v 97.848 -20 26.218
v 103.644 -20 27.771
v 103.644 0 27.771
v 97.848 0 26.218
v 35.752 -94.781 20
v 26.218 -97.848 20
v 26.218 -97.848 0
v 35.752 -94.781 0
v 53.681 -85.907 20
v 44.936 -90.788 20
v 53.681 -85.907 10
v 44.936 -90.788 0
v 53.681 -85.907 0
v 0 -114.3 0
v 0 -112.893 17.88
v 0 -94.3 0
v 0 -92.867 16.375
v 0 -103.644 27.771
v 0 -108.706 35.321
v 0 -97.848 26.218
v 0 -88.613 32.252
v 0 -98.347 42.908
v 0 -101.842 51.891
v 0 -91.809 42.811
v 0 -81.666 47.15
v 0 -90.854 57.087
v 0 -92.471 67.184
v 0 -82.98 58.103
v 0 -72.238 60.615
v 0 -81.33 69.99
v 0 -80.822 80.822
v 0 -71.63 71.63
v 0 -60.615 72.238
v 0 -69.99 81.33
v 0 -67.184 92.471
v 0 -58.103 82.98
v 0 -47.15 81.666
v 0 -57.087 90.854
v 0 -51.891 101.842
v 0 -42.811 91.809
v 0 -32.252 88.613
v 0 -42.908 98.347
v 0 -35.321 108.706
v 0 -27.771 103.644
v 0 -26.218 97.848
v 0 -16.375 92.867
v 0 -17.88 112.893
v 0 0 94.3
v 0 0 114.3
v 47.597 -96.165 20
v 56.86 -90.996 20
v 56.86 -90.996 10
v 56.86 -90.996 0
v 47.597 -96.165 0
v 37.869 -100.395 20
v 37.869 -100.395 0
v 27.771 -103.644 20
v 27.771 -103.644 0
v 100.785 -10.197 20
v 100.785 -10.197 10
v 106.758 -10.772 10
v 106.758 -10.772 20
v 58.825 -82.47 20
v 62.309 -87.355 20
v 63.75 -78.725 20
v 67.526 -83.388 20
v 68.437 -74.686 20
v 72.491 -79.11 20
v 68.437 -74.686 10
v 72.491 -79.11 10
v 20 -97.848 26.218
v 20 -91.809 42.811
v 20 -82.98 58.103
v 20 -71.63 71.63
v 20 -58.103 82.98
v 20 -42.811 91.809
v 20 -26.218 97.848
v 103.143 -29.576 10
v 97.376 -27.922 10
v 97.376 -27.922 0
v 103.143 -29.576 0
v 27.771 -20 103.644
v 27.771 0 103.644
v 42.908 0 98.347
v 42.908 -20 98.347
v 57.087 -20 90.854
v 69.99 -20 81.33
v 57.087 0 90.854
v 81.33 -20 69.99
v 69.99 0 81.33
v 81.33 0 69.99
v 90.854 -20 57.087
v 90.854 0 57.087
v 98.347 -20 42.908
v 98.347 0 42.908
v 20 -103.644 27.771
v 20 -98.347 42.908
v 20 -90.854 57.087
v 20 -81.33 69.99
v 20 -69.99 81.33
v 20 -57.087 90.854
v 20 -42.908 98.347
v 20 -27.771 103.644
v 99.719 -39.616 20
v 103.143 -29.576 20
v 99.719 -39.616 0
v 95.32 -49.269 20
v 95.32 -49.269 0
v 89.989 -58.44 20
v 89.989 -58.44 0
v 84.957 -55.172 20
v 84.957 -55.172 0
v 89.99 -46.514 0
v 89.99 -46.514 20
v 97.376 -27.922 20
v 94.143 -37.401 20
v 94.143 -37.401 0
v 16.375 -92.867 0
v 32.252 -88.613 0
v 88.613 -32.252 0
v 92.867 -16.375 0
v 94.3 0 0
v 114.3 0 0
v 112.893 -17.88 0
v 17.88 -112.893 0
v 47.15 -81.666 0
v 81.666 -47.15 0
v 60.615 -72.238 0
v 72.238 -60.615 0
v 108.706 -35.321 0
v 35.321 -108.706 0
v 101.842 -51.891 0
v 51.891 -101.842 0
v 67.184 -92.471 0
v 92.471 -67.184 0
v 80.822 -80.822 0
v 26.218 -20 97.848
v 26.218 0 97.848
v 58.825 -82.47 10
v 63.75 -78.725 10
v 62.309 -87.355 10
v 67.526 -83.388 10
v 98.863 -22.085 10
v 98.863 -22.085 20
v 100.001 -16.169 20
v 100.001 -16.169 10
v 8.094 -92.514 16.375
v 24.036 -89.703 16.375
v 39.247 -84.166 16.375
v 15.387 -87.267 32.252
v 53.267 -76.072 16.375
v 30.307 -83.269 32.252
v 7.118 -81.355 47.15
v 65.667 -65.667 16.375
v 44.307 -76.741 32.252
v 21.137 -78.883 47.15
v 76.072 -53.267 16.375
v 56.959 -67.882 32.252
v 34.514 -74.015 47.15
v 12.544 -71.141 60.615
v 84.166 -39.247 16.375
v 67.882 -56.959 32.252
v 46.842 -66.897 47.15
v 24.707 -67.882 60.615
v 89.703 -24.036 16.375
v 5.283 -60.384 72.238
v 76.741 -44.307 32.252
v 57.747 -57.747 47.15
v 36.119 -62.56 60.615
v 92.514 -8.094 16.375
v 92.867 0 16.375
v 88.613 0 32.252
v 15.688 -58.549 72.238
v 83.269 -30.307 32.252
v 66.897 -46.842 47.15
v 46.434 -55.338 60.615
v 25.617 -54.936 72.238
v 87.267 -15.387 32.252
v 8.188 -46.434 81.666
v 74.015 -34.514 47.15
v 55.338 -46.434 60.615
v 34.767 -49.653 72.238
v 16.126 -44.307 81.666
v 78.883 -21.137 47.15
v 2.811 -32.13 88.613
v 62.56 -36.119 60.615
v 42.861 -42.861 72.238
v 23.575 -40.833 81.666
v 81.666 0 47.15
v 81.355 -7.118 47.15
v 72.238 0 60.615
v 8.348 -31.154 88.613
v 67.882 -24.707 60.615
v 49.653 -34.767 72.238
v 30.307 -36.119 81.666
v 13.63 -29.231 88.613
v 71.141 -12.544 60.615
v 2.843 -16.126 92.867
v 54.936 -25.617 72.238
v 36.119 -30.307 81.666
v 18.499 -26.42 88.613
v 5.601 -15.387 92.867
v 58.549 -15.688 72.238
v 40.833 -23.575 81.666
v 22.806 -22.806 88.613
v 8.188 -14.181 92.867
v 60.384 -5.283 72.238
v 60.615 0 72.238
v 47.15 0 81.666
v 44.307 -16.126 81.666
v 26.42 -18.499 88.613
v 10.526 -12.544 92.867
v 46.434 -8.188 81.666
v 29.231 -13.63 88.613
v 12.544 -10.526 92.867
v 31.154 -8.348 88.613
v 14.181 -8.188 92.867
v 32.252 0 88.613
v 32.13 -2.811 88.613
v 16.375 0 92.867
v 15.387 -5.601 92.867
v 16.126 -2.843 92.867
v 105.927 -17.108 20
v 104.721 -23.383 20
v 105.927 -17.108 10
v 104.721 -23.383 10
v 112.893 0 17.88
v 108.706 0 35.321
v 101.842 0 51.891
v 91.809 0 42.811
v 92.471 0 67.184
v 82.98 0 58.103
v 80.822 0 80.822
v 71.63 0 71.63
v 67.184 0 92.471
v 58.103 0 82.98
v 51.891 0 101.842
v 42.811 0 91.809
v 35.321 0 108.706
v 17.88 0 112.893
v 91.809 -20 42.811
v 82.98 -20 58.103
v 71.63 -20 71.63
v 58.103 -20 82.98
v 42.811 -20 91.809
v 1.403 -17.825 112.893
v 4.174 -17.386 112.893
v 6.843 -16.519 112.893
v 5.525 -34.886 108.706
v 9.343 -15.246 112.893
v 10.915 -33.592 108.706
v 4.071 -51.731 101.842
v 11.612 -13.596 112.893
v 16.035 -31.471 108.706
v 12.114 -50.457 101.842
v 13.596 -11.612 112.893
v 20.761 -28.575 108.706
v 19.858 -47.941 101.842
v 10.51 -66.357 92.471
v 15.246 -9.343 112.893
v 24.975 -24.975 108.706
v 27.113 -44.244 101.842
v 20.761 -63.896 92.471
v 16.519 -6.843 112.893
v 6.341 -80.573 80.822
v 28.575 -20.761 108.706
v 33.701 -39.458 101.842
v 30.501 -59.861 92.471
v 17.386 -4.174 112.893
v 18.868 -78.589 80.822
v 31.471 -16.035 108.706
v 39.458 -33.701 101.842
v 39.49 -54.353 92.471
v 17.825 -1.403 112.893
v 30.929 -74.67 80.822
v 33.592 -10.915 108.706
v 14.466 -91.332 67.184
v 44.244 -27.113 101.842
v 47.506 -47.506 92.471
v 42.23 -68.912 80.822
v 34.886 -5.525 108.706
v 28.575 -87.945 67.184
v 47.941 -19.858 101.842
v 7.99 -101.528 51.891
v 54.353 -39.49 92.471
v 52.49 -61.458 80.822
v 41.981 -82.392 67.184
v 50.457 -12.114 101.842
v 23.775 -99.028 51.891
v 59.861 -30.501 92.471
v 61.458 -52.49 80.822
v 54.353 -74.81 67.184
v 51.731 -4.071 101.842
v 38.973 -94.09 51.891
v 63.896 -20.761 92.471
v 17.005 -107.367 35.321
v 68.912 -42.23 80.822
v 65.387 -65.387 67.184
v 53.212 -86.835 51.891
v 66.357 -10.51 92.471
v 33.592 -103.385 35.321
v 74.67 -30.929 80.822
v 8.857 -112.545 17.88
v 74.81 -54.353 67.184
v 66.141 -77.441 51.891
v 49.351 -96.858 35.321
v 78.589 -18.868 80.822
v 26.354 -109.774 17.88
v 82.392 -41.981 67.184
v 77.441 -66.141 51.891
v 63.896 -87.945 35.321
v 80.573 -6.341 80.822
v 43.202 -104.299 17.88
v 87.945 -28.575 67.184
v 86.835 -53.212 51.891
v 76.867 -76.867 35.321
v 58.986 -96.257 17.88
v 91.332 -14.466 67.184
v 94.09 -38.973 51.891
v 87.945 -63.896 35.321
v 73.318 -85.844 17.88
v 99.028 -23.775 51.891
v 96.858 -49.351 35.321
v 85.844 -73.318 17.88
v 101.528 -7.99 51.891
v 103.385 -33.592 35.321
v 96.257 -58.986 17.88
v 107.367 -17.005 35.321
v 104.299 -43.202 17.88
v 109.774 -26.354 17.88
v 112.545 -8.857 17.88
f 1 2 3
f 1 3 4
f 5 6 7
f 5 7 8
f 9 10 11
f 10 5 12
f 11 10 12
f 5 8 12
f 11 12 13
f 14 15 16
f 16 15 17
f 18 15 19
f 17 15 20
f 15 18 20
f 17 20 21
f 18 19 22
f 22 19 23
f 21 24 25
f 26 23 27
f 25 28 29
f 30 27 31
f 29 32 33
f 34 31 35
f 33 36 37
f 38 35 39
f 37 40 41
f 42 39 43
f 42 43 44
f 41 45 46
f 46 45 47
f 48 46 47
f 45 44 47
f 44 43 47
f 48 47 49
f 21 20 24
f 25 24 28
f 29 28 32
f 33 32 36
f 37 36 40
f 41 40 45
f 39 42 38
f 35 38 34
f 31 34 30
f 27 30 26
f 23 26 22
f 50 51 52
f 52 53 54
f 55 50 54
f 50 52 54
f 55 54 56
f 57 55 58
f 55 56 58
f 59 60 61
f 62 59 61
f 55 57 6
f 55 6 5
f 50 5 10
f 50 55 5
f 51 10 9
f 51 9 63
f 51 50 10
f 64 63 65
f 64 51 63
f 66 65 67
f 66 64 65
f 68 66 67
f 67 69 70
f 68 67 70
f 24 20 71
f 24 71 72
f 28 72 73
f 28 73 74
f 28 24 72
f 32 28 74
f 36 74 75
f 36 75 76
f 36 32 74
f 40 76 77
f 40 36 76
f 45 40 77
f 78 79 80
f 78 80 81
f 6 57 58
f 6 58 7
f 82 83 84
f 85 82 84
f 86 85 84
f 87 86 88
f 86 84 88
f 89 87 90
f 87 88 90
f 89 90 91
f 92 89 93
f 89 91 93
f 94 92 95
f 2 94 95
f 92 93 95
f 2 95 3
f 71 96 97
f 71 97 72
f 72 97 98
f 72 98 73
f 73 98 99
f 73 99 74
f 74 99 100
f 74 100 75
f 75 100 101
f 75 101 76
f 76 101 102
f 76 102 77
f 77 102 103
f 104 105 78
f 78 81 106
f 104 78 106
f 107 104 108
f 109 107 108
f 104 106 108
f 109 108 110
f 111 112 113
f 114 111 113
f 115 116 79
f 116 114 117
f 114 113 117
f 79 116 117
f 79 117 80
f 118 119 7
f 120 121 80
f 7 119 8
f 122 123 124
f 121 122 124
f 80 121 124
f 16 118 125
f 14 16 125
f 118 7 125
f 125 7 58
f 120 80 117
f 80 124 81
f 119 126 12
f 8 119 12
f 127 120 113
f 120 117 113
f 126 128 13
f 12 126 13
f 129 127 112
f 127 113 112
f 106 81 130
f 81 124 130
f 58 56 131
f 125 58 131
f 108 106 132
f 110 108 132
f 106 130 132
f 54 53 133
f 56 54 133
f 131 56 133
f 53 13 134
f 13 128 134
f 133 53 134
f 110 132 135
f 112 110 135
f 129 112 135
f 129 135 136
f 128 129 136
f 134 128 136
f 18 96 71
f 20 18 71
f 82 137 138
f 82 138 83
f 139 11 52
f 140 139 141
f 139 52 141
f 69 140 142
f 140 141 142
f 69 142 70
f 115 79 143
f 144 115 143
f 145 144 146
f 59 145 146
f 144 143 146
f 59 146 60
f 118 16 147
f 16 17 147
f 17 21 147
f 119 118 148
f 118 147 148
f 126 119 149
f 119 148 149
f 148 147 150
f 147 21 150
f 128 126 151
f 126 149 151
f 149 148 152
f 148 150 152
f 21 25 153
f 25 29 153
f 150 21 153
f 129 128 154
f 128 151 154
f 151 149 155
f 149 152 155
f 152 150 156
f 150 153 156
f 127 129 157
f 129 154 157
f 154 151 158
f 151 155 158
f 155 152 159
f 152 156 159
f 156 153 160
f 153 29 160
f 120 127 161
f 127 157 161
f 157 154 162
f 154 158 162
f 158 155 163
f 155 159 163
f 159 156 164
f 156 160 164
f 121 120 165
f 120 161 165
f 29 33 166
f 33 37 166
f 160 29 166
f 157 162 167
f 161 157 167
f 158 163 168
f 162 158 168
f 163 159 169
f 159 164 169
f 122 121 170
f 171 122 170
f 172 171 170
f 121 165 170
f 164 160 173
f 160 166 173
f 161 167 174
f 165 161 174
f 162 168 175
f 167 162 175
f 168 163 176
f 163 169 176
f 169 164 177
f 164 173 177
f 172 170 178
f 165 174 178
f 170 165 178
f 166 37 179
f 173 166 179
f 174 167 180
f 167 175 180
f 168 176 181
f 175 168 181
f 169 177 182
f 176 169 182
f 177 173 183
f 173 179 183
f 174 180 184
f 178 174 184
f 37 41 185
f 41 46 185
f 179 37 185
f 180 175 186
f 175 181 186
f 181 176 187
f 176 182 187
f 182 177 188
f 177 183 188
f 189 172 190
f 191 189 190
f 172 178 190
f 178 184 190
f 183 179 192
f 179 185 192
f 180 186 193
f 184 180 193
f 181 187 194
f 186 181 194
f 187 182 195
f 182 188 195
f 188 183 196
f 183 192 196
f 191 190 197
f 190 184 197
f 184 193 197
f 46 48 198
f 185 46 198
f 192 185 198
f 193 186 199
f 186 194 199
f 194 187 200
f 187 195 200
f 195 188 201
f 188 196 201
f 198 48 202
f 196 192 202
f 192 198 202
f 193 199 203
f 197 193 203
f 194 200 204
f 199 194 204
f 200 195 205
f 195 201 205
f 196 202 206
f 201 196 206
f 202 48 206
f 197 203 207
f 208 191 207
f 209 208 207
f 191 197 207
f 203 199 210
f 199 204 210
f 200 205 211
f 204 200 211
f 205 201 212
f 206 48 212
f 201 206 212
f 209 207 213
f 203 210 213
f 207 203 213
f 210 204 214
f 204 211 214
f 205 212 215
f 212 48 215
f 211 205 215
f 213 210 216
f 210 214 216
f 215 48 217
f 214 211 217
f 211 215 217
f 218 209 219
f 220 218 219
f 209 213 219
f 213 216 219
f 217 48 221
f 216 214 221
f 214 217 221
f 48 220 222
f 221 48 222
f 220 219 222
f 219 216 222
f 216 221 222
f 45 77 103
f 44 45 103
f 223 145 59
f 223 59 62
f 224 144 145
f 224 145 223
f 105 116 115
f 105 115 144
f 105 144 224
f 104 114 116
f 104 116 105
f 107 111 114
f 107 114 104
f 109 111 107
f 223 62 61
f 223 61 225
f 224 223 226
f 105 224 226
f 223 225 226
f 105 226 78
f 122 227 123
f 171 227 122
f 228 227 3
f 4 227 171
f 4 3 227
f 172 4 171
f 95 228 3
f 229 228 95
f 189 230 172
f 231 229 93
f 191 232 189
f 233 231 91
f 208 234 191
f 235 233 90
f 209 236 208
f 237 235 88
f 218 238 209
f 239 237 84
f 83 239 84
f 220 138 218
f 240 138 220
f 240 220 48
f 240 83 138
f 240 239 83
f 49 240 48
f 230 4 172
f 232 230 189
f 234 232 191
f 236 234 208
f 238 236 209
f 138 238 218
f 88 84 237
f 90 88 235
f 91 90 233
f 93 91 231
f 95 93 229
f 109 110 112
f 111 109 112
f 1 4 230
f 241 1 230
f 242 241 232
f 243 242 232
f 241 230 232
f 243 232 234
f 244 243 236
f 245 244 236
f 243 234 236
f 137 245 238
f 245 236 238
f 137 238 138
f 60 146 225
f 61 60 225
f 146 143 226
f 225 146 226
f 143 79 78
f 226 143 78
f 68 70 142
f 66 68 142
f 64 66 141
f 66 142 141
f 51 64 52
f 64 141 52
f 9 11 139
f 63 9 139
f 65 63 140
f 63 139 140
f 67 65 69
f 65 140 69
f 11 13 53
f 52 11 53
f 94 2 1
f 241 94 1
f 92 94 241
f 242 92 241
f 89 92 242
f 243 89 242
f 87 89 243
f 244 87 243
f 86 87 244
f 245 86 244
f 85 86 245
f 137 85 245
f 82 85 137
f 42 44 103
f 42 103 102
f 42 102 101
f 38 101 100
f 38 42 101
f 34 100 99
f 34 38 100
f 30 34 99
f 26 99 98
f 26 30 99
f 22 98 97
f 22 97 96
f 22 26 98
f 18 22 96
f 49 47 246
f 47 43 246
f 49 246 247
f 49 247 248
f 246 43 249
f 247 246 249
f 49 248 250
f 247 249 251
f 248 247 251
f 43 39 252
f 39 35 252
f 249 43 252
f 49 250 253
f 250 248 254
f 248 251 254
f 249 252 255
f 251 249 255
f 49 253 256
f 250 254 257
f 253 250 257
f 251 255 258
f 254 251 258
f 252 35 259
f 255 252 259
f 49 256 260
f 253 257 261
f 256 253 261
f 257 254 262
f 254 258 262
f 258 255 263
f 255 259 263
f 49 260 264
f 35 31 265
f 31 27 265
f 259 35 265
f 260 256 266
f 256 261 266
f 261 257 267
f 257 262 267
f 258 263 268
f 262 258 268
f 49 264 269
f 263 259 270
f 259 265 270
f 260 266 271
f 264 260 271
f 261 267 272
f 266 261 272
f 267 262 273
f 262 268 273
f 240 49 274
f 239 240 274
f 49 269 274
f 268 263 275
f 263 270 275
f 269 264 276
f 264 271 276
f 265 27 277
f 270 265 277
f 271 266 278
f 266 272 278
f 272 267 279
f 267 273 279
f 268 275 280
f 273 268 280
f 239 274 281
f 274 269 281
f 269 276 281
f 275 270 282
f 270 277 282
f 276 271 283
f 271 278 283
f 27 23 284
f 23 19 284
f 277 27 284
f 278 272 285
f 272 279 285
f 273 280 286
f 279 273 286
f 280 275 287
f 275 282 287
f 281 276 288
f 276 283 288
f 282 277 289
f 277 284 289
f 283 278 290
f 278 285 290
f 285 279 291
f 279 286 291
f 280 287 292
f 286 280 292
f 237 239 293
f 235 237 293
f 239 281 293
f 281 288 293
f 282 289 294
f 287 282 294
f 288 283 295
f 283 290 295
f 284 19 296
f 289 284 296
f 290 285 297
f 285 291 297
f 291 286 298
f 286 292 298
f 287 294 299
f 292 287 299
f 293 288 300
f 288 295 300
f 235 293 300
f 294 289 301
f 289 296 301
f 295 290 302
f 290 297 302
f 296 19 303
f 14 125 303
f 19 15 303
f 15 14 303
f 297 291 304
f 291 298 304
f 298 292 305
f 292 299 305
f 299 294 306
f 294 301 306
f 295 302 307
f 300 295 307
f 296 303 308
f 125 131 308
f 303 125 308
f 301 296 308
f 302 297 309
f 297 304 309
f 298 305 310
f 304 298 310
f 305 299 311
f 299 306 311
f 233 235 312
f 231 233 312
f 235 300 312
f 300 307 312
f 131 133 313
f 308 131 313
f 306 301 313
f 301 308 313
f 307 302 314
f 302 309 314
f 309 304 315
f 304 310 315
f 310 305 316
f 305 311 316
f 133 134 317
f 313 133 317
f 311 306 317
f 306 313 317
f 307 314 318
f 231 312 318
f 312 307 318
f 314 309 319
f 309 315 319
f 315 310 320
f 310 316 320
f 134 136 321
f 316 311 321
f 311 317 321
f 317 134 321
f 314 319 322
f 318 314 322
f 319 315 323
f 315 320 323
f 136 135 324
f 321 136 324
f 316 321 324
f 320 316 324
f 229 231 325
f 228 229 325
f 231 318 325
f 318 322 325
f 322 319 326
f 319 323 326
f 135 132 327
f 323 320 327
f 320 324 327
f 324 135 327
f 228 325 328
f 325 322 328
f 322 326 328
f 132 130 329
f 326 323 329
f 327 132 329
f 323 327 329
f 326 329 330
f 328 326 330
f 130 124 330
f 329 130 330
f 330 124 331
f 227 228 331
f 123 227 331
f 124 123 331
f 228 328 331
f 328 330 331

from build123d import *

# Parameters (mm, degrees)
F1_ANGLE  = 90
F3_DEPTH  = 20
F5_DEPTH  = 20
F7_DEPTH  = 20
F10_DEPTH = 10


with BuildPart() as f1:
    # F0 (on Right) → F1 (revolve)
    with BuildSketch(Plane.YZ):
        with BuildLine():
            Line((0, 94.3), (0, 114.3))
            ThreePointArc((0, 114.3), (-80.8223050896, 80.8223050896), (-114.3, 0))
            Line((-114.3, 0), (-94.3, 0))
            ThreePointArc((-94.3, 0), (-66.6801694659, 66.6801694659), (0, 94.3))
        make_face()
    revolve(axis=Axis((0, 0, 104.3), (0, 0, 1)), revolution_arc=F1_ANGLE)

    # F2 (on face) → F3 (cut)
    with BuildSketch(Plane(origin=(0, 0, 0), x_dir=(-1, 0, 0), z_dir=(0, 1, 0))):
        with BuildLine():
            Line((-26.2183692689, 97.8482862031), (-27.7712835395, 103.6438411608))
            ThreePointArc((-27.7712835395, 103.6438411608), (-75.8725576213, 75.8725576213), (-103.6438411608, 27.7712835395))
            Line((-103.6438411608, 27.7712835395), (-97.8482862031, 26.2183692689))
            ThreePointArc((-97.8482862031, 26.2183692689), (-71.6299169342, 71.6299169342), (-26.2183692689, 97.8482862031))
        make_face()
    extrude(amount=-F3_DEPTH, mode=Mode.SUBTRACT)

    # F4 (on face) → F5 (cut)
    with BuildSketch(Plane.YZ):
        with BuildLine():
            ThreePointArc((-97.8482862031, 26.2183692689), (-71.6299169342, 71.6299169342), (-26.2183692689, 97.8482862031))
            Line((-26.2183692689, 97.8482862031), (-27.7712835395, 103.6438411608))
            ThreePointArc((-27.7712835395, 103.6438411608), (-75.8725576213, 75.8725576213), (-103.6438411608, 27.7712835395))
            Line((-103.6438411608, 27.7712835395), (-97.8482862031, 26.2183692689))
        make_face()
    extrude(amount=F5_DEPTH, mode=Mode.SUBTRACT)

    # F6 (on face) → F7 (cut)
    with BuildSketch(Plane(origin=(0, 0, 0), x_dir=(1, 0, 0), z_dir=(0, 0, -1))):
        with BuildLine():
            Line((27.7712835395, 103.6438411608), (26.2183692689, 97.8482862031))
            ThreePointArc((26.2183692689, 97.8482862031), (40.3932806821, 92.8981855352), (53.6808214668, 85.9072721406))
            Line((53.6808214668, 85.9072721406), (56.8603370522, 90.9955607176))
            ThreePointArc((56.8603370522, 90.9955607176), (42.7857750957, 98.4005459815), (27.7712835395, 103.6438411608))
        make_face()
        with BuildLine():
            ThreePointArc((84.9573285329, 55.171934247), (92.1790767398, 42.0084254811), (97.3758097986, 27.9220641443))
            Line((97.3758097986, 27.9220641443), (103.1433799742, 29.5758882792))
            ThreePointArc((103.1433799742, 29.5758882792), (97.6388443651, 44.496584937), (89.9893519405, 58.4397684571))
            Line((89.9893519405, 58.4397684571), (84.9573285329, 55.171934247))
        make_face()
    extrude(amount=-F7_DEPTH, mode=Mode.SUBTRACT)

    # F9 (on offset) → F10 (cut)
    with BuildSketch(Plane(origin=(0, 0, 10), x_dir=(1, 0, 0), z_dir=(0, 0, -1))):
        with BuildLine():
            ThreePointArc((97.3758097986, 27.9220641443), (99.4762319066, 19.1355503099), (100.7854867979, 10.1968451452))
            Line((100.7854867979, 10.1968451452), (106.7579299629, 10.7719260129))
            ThreePointArc((106.7579299629, 10.7719260129), (105.3709505868, 20.2546975401), (103.1433799742, 29.5758882792))
            Line((103.1433799742, 29.5758882792), (97.3758097986, 27.9220641443))
        make_face()
        Polygon((0.327321584, 0.5238240331), (0, 0), (0.4947707785, 0.5399475566), align=None)
        Polygon((0.4947707785, 0.5399475566), (0, 0), (2.5848787999, 0.7412020686), align=None)
        with BuildLine():
            Line((56.8603370522, 90.9955607176), (53.6808214668, 85.9072721406))
            ThreePointArc((53.6808214668, 85.9072721406), (61.3162809887, 80.6350028568), (68.4372880315, 74.6861942189))
            Line((68.4372880315, 74.6861942189), (72.4908292772, 79.1098582397))
            ThreePointArc((72.4908292772, 79.1098582397), (64.948044917, 85.411014872), (56.8603370522, 90.9955607176))
        make_face()
    extrude(amount=-F10_DEPTH, mode=Mode.SUBTRACT)


solid = f1.part
